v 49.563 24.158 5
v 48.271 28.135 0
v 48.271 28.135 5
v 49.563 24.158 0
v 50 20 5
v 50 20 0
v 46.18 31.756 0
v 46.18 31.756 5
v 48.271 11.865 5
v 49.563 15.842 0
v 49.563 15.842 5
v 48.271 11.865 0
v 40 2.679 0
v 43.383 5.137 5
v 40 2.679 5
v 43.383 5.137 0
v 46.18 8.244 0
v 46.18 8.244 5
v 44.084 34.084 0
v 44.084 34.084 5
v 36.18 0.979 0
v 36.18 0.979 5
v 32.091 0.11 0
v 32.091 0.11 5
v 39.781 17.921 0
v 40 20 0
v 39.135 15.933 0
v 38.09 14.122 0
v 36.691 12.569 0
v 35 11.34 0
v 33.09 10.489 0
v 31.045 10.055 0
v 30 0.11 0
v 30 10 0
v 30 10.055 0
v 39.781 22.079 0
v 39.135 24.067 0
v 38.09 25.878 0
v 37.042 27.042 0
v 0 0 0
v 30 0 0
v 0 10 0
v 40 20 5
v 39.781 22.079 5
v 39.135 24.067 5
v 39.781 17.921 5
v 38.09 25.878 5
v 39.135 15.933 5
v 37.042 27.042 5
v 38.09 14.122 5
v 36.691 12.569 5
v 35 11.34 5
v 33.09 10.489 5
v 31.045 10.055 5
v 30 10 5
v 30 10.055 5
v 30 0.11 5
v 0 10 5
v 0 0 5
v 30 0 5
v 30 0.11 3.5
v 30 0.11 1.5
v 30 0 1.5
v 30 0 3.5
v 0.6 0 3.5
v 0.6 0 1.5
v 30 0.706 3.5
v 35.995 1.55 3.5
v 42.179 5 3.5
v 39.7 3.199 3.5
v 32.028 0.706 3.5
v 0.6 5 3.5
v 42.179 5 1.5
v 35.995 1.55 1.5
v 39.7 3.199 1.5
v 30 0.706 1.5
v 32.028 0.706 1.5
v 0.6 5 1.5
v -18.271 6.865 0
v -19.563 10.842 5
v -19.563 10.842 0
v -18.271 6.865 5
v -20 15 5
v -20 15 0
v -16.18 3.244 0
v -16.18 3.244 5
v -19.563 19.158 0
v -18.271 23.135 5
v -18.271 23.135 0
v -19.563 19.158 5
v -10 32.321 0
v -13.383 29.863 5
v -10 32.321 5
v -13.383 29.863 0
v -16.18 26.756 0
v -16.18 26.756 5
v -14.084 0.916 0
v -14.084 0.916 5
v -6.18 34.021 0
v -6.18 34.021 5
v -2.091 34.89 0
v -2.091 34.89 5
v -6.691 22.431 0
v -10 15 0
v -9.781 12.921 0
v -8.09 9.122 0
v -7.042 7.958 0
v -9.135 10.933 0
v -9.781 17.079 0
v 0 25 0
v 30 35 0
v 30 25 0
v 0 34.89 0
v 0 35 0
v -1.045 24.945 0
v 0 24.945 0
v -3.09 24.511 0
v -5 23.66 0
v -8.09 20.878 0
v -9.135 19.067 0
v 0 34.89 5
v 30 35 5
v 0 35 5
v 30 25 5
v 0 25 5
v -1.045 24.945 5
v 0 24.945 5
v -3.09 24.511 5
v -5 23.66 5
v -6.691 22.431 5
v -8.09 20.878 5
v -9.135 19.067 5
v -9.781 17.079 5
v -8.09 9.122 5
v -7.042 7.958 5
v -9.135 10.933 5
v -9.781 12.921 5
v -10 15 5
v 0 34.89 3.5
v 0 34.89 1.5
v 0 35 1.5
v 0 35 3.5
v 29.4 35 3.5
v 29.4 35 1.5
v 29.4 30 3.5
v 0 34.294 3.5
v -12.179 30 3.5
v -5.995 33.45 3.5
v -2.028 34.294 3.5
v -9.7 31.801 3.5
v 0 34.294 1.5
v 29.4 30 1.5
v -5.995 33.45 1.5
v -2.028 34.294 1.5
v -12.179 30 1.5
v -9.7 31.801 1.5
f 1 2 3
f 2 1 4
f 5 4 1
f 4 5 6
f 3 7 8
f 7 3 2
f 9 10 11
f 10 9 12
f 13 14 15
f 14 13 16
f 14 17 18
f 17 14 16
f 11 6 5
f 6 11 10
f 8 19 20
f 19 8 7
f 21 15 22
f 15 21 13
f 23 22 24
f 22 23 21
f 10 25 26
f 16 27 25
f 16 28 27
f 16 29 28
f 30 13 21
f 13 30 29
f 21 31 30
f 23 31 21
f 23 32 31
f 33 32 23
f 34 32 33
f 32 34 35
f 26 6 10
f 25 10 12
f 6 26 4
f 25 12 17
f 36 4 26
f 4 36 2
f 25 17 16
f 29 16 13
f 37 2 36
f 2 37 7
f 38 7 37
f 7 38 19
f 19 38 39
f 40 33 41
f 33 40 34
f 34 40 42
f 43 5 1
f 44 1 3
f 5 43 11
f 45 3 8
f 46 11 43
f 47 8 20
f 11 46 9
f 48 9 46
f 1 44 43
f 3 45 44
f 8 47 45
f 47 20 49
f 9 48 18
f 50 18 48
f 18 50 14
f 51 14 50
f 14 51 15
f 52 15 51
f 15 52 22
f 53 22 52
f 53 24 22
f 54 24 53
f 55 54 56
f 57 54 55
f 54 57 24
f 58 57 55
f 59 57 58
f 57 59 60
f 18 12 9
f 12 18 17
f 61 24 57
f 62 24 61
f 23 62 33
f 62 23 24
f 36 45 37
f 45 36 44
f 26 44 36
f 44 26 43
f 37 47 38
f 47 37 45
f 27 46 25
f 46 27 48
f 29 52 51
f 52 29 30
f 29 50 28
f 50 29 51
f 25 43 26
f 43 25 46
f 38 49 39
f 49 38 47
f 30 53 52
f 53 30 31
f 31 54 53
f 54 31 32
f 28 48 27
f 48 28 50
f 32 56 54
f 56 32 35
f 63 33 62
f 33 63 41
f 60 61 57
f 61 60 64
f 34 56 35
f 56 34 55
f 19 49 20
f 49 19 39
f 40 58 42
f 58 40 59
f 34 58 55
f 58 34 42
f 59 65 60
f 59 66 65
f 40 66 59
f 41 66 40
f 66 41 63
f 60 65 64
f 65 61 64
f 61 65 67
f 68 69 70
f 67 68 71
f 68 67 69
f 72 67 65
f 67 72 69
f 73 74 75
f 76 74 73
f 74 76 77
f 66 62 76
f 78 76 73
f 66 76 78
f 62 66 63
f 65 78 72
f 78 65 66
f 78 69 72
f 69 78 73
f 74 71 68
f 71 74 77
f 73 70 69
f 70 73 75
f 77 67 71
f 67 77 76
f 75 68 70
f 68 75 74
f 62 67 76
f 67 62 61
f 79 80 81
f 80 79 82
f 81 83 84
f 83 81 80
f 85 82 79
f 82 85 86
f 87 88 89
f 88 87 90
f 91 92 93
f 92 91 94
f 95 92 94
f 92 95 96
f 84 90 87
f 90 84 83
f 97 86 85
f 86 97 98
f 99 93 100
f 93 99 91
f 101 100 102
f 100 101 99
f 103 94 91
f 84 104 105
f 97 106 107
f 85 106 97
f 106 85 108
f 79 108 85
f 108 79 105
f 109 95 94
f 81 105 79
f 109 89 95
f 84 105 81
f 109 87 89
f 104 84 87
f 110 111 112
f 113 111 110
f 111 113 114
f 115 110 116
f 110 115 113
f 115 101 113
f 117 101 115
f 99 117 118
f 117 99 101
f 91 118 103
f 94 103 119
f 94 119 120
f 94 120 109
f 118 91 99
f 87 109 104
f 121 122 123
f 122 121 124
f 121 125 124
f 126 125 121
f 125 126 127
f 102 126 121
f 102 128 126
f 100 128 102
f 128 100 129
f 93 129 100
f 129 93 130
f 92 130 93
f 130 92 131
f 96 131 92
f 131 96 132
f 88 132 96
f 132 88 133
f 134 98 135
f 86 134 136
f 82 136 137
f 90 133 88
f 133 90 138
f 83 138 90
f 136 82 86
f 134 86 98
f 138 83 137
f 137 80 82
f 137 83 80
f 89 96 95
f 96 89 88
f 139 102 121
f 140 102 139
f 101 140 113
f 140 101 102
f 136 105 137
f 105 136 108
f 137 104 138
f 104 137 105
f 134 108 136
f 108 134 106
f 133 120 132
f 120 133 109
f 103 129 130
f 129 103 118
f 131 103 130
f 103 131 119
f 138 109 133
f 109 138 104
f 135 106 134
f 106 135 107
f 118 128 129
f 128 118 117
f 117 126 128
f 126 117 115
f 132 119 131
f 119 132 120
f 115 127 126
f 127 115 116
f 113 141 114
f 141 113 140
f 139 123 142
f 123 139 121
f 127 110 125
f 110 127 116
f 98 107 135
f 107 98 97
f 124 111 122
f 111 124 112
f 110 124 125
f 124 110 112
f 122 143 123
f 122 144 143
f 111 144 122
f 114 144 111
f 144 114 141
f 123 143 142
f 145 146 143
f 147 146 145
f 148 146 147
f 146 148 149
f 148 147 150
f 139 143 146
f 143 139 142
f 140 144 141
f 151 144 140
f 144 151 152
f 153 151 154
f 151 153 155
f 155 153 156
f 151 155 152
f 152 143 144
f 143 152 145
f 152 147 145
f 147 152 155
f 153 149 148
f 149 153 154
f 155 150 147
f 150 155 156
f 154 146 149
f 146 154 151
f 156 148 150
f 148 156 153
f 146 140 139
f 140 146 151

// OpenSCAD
module eyebrow(h=5,t=10,stroke=30,circle=10,inc=2){
	difference(){
		union(){
			translate([stroke,circle+t,0])
			intersection(){
				difference(){
					cylinder(h=h,r=circle+t);
					cylinder(h=h*4,r=circle,center=true);
				}
				union(){
					mirror([0,1,0]) translate([0,0,-h]) cube([circle+t,circle+t,h*3]);
					rotate([0,0,45]) mirror([0,1,0]) translate([0,0,-h]) cube([circle+t,circle+t,h*3]);
				}
			}
			cube([stroke,t,h]);
		}
		translate([0.6,-t/2,h/2-inc/2]) cube([stroke,t,inc]);
		translate([stroke,-t/2,h/2-inc/2]) cube([stroke,t,inc]);
	}

	translate([stroke,circle+t,0])intersection(){
		difference(){
			cylinder(h=h,r=circle+t);
			cylinder(h=h*4,r=circle+t-0.6,center=true);
		}
		union(){
			mirror([0,1,0]) translate([0,0,-h]) cube([circle+t,circle+t,h*3]);
		}
	}
}
eyebrow();
translate([30,35,0]) rotate([0,0,180]) eyebrow();
